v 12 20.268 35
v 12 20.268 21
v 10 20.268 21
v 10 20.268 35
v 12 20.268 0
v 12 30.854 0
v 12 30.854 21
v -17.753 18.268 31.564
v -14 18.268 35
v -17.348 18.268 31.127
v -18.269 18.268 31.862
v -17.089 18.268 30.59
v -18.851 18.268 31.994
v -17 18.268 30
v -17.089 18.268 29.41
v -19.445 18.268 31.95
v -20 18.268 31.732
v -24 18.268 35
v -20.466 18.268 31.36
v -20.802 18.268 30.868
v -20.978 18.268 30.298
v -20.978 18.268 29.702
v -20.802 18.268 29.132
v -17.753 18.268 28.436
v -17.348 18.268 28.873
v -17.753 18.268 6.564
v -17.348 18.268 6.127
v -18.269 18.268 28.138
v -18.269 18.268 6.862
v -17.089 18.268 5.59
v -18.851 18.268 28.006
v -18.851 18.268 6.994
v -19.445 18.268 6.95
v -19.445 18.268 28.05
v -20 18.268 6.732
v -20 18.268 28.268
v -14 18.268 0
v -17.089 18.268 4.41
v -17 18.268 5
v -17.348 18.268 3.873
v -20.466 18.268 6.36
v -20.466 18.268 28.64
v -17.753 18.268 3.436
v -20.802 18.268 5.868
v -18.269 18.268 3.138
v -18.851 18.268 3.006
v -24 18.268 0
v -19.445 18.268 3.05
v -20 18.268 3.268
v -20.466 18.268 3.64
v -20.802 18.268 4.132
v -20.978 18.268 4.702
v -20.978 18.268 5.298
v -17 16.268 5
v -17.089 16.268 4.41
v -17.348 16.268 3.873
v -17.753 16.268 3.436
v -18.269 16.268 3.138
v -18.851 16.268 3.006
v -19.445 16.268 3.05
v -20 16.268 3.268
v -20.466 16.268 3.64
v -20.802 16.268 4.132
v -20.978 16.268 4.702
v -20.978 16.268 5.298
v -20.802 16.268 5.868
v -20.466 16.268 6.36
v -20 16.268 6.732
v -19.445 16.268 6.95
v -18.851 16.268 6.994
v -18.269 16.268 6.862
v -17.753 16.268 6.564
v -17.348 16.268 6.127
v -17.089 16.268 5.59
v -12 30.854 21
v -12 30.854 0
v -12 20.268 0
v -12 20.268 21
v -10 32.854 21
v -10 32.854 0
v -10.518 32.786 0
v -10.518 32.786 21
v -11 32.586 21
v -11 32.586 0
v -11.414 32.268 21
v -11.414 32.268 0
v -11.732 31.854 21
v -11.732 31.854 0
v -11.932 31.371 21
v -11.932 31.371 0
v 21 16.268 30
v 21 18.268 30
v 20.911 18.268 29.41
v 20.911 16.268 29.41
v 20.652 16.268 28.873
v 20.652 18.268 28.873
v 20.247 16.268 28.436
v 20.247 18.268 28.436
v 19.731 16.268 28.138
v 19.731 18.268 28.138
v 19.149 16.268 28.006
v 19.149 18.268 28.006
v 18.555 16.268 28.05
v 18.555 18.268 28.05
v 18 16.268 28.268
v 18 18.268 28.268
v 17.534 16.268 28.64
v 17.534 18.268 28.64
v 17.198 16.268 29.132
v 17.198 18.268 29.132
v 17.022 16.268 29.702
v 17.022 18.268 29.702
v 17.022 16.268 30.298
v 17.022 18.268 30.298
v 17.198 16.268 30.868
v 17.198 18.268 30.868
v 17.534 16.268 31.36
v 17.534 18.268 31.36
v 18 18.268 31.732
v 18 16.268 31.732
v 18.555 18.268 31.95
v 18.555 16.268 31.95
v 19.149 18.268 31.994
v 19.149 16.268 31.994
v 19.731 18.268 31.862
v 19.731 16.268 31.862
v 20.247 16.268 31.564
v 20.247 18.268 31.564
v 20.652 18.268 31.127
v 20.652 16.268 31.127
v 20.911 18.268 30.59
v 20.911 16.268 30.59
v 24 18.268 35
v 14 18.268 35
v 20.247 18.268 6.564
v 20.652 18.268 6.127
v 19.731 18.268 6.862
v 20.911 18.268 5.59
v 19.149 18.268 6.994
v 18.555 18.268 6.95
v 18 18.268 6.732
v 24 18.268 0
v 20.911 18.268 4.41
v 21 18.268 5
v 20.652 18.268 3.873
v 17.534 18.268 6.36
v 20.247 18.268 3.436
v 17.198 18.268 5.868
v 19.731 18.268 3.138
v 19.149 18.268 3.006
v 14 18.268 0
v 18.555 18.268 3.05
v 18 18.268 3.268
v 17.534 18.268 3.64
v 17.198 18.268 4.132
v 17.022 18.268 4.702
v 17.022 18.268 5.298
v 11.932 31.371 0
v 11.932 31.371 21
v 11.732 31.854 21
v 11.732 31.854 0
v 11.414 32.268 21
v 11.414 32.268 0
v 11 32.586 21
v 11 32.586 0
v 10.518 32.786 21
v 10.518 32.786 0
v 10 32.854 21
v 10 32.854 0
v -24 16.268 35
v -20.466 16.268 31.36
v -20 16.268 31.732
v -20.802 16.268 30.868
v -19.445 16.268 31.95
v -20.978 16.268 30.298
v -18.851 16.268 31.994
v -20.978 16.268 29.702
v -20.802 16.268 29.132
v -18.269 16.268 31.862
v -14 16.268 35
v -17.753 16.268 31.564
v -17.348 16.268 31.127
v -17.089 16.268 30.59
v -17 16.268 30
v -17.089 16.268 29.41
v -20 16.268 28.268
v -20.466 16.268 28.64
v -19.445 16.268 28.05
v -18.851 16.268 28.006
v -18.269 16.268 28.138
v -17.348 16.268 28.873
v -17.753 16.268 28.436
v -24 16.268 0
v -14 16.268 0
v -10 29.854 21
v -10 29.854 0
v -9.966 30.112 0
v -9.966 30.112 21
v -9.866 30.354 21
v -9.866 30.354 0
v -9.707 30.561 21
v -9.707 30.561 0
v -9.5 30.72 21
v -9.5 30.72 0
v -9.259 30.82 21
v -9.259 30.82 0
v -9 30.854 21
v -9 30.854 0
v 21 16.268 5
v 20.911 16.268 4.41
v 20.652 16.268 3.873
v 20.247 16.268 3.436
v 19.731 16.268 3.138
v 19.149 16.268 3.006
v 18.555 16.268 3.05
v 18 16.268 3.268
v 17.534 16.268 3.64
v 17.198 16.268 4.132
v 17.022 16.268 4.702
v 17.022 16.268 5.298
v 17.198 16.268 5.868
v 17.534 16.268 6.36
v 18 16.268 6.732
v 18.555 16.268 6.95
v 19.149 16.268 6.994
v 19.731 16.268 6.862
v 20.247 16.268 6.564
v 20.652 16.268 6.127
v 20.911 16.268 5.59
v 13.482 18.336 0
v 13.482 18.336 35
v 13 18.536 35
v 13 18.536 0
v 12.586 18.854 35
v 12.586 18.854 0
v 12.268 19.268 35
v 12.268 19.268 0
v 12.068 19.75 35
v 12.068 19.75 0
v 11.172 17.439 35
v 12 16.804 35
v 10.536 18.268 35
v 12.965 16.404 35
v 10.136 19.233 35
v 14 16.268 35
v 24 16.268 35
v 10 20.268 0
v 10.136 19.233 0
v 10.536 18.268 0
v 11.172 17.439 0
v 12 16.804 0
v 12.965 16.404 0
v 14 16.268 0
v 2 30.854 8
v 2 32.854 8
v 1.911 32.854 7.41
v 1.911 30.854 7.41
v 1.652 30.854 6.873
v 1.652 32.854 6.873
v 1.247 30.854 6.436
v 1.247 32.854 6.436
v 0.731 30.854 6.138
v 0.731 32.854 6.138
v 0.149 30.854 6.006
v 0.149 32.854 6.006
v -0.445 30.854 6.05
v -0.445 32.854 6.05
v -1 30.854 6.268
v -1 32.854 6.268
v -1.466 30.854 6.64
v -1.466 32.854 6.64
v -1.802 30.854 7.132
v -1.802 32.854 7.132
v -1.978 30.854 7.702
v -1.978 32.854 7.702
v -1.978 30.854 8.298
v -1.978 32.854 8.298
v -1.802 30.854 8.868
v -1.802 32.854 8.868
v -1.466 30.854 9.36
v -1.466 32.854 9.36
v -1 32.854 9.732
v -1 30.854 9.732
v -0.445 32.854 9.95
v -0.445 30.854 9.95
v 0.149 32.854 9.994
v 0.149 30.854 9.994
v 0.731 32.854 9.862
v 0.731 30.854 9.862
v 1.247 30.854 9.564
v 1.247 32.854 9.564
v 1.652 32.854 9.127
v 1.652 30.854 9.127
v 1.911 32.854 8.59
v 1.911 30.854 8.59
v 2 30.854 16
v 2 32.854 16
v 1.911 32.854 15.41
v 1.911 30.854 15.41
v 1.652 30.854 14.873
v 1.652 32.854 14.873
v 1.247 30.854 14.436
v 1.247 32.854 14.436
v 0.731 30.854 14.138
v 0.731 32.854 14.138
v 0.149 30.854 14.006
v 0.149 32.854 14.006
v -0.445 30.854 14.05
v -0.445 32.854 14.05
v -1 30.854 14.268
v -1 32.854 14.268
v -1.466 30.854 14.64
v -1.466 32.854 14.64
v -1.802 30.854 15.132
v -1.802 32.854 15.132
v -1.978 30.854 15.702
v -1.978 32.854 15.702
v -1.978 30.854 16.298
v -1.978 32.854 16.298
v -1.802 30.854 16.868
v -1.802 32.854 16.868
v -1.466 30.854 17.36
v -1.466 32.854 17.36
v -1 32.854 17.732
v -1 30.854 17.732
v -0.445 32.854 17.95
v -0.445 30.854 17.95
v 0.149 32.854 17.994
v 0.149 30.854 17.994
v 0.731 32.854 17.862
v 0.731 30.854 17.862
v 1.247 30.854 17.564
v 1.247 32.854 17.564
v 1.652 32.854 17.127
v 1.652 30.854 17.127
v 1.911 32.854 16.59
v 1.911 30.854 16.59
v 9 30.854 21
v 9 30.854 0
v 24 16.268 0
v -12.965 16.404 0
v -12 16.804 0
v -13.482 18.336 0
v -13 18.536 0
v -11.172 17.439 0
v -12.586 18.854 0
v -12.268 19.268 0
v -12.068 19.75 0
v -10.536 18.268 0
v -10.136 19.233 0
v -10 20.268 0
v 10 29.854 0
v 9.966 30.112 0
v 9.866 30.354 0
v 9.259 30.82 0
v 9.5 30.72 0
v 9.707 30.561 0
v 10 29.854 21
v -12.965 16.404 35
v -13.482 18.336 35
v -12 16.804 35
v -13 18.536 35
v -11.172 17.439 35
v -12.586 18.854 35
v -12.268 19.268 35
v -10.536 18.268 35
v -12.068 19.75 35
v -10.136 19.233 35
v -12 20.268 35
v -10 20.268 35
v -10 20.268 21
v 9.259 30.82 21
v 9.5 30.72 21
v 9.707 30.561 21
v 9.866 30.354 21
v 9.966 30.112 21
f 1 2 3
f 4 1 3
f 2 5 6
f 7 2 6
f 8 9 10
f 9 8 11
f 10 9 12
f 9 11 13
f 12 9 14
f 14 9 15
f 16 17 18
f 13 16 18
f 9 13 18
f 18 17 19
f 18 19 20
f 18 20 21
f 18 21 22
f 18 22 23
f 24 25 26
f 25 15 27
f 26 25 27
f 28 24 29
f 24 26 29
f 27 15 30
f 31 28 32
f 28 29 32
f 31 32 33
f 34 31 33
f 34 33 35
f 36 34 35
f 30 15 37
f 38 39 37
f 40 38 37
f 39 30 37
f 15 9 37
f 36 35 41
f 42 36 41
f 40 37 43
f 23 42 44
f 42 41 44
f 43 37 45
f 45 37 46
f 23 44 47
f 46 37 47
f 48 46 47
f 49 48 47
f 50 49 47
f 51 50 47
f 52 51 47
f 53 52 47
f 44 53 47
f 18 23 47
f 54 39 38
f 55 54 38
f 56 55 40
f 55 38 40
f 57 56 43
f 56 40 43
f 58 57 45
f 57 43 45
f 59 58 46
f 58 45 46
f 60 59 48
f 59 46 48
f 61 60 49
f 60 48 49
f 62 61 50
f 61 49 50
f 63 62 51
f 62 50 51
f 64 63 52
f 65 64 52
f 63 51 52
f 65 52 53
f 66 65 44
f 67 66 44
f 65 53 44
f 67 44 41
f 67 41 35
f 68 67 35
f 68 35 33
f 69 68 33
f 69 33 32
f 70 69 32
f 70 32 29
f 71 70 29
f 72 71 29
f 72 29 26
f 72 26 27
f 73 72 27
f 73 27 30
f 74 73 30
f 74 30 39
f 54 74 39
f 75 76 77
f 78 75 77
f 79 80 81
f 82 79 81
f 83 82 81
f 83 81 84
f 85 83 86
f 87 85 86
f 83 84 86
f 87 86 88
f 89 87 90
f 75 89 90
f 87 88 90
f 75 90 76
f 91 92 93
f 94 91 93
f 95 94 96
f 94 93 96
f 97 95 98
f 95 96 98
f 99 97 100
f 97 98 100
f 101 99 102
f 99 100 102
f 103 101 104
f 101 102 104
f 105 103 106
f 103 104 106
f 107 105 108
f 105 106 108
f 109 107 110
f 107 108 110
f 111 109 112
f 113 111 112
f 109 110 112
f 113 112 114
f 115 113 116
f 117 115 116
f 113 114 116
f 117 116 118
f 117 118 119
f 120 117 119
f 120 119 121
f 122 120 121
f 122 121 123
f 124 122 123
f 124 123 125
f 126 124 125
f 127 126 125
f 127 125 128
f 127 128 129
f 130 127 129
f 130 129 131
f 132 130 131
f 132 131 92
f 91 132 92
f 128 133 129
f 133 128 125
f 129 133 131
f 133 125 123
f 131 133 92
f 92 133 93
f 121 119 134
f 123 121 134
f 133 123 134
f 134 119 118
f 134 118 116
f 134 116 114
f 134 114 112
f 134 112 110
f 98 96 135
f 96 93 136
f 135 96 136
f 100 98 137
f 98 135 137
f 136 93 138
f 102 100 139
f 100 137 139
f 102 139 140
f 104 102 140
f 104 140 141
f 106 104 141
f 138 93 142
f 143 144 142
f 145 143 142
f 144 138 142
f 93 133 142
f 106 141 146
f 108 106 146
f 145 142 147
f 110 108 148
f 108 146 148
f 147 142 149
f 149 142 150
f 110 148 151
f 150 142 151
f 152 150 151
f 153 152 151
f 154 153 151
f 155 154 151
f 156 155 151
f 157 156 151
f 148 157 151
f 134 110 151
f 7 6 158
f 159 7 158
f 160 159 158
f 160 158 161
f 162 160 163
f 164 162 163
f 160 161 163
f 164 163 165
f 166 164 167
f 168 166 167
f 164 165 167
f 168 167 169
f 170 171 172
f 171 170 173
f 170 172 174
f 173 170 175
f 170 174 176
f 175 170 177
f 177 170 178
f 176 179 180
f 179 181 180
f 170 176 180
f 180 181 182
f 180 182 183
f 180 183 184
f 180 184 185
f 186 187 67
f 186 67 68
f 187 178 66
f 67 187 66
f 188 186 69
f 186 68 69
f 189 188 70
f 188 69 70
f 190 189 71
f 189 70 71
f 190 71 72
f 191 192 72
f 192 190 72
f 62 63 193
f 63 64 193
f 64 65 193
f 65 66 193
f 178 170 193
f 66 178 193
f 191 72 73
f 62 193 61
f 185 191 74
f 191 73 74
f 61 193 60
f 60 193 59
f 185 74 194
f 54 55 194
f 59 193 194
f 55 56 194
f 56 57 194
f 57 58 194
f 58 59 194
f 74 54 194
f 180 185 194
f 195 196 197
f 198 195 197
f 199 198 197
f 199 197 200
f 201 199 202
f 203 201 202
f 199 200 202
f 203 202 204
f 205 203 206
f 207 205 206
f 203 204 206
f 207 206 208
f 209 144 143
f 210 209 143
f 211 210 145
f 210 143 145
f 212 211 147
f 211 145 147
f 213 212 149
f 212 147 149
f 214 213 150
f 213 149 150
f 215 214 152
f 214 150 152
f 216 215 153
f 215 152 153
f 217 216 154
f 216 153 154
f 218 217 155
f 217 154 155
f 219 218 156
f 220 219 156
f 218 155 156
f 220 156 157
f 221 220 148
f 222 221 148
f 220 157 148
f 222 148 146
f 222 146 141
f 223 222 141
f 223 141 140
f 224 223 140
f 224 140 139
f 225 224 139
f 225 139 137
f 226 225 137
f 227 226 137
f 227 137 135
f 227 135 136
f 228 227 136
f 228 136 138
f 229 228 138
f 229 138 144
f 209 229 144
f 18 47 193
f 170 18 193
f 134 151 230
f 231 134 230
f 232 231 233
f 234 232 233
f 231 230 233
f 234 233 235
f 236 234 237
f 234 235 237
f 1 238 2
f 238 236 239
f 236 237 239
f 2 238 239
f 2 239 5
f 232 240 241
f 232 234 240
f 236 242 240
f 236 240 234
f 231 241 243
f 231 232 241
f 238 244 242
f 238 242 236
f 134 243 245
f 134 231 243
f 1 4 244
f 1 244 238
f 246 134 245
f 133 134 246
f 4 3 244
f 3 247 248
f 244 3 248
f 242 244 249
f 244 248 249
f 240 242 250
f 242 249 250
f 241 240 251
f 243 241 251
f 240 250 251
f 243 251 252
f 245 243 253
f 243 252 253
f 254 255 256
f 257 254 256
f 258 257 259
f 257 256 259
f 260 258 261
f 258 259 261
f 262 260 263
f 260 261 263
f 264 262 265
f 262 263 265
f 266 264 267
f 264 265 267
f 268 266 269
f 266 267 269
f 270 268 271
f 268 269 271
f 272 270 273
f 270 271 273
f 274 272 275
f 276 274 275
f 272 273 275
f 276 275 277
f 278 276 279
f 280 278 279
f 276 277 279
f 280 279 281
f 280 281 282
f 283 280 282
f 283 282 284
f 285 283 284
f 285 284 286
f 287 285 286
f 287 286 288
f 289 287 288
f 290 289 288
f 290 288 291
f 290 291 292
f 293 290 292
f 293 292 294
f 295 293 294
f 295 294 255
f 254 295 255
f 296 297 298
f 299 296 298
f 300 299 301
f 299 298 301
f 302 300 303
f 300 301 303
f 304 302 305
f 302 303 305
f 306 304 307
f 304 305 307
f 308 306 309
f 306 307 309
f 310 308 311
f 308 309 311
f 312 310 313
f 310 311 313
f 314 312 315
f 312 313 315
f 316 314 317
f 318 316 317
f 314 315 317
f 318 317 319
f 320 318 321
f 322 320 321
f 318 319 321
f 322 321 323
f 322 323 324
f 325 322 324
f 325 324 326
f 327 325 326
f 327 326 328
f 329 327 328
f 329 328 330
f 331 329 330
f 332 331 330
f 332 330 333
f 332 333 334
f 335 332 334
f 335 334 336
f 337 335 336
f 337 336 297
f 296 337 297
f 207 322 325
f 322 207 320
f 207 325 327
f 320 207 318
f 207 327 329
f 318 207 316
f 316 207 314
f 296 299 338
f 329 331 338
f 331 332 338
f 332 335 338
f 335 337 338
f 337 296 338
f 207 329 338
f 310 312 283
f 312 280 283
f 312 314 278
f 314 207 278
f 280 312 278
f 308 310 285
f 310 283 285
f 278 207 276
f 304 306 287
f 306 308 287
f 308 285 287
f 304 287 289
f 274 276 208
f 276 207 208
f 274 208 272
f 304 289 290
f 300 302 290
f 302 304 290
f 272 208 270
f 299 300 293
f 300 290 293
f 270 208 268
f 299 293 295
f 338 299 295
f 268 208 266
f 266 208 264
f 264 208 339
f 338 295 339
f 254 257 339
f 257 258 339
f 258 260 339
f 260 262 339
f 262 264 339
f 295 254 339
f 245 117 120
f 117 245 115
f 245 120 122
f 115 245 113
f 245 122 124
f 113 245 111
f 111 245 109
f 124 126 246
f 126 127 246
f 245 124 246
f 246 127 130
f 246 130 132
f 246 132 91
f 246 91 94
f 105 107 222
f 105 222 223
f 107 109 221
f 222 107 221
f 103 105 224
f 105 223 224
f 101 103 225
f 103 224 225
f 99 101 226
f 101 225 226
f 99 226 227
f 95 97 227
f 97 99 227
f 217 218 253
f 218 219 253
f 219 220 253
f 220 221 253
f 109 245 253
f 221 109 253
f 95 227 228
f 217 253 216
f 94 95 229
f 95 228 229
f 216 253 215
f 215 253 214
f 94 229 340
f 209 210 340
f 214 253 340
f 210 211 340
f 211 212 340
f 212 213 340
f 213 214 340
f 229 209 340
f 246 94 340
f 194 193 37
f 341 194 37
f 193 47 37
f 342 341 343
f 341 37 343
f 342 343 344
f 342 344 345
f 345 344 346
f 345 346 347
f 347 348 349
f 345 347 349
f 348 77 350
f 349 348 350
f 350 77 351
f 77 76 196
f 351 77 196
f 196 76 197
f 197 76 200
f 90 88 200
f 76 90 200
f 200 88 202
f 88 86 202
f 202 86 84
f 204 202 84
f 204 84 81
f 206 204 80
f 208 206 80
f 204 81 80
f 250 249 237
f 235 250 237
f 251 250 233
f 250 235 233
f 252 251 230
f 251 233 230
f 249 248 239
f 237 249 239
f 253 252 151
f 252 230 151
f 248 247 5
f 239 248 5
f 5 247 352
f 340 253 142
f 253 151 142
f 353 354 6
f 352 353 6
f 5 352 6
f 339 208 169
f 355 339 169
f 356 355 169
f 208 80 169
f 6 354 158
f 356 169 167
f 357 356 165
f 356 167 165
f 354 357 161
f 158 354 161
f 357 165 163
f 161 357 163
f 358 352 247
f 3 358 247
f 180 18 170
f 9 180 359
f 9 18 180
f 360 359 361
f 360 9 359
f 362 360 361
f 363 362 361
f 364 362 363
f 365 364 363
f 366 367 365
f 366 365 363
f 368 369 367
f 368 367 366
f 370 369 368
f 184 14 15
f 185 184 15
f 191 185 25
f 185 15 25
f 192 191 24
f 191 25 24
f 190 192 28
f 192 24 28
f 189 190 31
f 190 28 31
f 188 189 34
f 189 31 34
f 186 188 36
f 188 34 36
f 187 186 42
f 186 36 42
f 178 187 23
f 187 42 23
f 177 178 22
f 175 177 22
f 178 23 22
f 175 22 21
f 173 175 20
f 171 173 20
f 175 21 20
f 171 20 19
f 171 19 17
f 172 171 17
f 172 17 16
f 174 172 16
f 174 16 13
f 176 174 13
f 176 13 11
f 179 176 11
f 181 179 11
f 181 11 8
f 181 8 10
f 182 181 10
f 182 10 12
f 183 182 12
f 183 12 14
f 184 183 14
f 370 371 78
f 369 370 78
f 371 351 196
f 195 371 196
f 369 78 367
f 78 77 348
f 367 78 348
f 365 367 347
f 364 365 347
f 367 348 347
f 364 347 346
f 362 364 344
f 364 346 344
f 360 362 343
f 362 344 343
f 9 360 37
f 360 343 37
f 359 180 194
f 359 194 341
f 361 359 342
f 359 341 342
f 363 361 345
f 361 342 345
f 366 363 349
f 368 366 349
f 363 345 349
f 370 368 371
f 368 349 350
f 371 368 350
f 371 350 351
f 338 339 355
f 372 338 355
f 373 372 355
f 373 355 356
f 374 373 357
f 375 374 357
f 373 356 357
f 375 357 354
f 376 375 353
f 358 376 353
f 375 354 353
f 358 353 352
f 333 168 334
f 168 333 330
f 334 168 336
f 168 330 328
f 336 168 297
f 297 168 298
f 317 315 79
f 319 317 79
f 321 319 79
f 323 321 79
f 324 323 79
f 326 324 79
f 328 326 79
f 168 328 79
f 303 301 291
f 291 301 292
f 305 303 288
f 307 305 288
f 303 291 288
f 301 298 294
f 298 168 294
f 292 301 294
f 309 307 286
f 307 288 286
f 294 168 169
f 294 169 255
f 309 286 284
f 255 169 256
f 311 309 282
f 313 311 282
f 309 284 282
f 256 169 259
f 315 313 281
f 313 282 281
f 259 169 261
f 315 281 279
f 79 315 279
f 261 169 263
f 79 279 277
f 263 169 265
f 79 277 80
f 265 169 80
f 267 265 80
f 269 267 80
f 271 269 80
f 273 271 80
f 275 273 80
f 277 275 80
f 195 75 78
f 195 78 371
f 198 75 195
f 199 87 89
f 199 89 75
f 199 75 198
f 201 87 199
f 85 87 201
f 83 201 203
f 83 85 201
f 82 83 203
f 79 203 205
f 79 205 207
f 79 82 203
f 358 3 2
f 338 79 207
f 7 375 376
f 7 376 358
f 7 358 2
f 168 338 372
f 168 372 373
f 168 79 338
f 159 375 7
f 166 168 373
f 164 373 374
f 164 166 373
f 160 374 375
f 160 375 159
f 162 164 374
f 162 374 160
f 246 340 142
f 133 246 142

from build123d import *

# Parameters (mm, degrees)
BOSS_EXTRUDE1_DEPTH   = 35
BOSS_EXTRUDE1_2_DEPTH = 35
BOSS_EXTRUDE2_DEPTH   = 21
SKETCH3_R             = 2
CUT_EXTRUDE1_DEPTH    = 46.564112103


with BuildPart() as part:
    # Sketch2 → Boss-Extrude1 (new body)
    with BuildSketch(Plane.XY):
        with BuildLine():
            Line((-24, 18.267872099), (-24, 16.267872099))
            Line((-24, 16.267872099), (-14, 16.267872099))
            ThreePointArc((-14, 16.267872099), (-11.171572875, 17.439444974), (-10, 20.267872099))
            Line((-10, 20.267872099), (-12, 20.267872099))
            ThreePointArc((-12, 20.267872099), (-12.585786438, 18.853658537), (-14, 18.267872099))
            Line((-14, 18.267872099), (-24, 18.267872099))
        make_face()
    extrude(amount=BOSS_EXTRUDE1_DEPTH)



with BuildPart() as body_2:
    # Sketch2 → Boss-Extrude1 2 (new body)
    with BuildSketch(Plane.XY):
        with BuildLine():
            Line((12, 20.267872099), (10, 20.267872099))
            ThreePointArc((10, 20.267872099), (11.171572875, 17.439444974), (14, 16.267872099))
            Line((14, 16.267872099), (24, 16.267872099))
            Line((24, 16.267872099), (24, 18.267872099))
            Line((24, 18.267872099), (14, 18.267872099))
            ThreePointArc((14, 18.267872099), (12.585786438, 18.853658537), (12, 20.267872099))
        make_face()
    extrude(amount=BOSS_EXTRUDE1_2_DEPTH)


with BuildPart() as part_1:
    add(part.part)

    add(body_2.part)  # Boss-Extrude2 merges body 2
    # Sketch2<3> → Boss-Extrude2 (add)
    with BuildSketch(Plane.XY):
        with BuildLine():
            Line((-12, 20.267872099), (-10, 20.267872099))
            Line((-10, 20.267872099), (-10, 29.853658537))
            ThreePointArc((-10, 29.853658537), (-9.707106781, 30.560765318), (-9, 30.853658537))
            Line((-9, 30.853658537), (9, 30.853658537))
            ThreePointArc((9, 30.853658537), (9.707106781, 30.560765318), (10, 29.853658537))
            Line((10, 29.853658537), (10, 20.267872099))
            Line((10, 20.267872099), (12, 20.267872099))
            Line((12, 20.267872099), (12, 30.853658537))
            ThreePointArc((12, 30.853658537), (11.414213562, 32.267872099), (10, 32.853658537))
            Line((10, 32.853658537), (-10, 32.853658537))
            ThreePointArc((-10, 32.853658537), (-11.414213562, 32.267872099), (-12, 30.853658537))
            Line((-12, 30.853658537), (-12, 20.267872099))
        make_face()
    extrude(amount=BOSS_EXTRUDE2_DEPTH)

    # Sketch3 → Cut-Extrude1 (cut, through all)
    with BuildSketch(Plane(origin=(0, 32.853658537, 0), x_dir=(1, 0, 0), z_dir=(0, 1, 0))):
        with Locations((0, -8)):
            Circle(SKETCH3_R)
        with Locations((0, -16)):
            Circle(SKETCH3_R)
        with Locations((-19, -5)):
            Circle(SKETCH3_R)
        with Locations((-19, -30)):
            Circle(SKETCH3_R)
        with Locations((19, -5)):
            Circle(SKETCH3_R)
        with Locations((19, -30)):
            Circle(SKETCH3_R)
    extrude(amount=-CUT_EXTRUDE1_DEPTH, mode=Mode.SUBTRACT)


solid = part_1.part
